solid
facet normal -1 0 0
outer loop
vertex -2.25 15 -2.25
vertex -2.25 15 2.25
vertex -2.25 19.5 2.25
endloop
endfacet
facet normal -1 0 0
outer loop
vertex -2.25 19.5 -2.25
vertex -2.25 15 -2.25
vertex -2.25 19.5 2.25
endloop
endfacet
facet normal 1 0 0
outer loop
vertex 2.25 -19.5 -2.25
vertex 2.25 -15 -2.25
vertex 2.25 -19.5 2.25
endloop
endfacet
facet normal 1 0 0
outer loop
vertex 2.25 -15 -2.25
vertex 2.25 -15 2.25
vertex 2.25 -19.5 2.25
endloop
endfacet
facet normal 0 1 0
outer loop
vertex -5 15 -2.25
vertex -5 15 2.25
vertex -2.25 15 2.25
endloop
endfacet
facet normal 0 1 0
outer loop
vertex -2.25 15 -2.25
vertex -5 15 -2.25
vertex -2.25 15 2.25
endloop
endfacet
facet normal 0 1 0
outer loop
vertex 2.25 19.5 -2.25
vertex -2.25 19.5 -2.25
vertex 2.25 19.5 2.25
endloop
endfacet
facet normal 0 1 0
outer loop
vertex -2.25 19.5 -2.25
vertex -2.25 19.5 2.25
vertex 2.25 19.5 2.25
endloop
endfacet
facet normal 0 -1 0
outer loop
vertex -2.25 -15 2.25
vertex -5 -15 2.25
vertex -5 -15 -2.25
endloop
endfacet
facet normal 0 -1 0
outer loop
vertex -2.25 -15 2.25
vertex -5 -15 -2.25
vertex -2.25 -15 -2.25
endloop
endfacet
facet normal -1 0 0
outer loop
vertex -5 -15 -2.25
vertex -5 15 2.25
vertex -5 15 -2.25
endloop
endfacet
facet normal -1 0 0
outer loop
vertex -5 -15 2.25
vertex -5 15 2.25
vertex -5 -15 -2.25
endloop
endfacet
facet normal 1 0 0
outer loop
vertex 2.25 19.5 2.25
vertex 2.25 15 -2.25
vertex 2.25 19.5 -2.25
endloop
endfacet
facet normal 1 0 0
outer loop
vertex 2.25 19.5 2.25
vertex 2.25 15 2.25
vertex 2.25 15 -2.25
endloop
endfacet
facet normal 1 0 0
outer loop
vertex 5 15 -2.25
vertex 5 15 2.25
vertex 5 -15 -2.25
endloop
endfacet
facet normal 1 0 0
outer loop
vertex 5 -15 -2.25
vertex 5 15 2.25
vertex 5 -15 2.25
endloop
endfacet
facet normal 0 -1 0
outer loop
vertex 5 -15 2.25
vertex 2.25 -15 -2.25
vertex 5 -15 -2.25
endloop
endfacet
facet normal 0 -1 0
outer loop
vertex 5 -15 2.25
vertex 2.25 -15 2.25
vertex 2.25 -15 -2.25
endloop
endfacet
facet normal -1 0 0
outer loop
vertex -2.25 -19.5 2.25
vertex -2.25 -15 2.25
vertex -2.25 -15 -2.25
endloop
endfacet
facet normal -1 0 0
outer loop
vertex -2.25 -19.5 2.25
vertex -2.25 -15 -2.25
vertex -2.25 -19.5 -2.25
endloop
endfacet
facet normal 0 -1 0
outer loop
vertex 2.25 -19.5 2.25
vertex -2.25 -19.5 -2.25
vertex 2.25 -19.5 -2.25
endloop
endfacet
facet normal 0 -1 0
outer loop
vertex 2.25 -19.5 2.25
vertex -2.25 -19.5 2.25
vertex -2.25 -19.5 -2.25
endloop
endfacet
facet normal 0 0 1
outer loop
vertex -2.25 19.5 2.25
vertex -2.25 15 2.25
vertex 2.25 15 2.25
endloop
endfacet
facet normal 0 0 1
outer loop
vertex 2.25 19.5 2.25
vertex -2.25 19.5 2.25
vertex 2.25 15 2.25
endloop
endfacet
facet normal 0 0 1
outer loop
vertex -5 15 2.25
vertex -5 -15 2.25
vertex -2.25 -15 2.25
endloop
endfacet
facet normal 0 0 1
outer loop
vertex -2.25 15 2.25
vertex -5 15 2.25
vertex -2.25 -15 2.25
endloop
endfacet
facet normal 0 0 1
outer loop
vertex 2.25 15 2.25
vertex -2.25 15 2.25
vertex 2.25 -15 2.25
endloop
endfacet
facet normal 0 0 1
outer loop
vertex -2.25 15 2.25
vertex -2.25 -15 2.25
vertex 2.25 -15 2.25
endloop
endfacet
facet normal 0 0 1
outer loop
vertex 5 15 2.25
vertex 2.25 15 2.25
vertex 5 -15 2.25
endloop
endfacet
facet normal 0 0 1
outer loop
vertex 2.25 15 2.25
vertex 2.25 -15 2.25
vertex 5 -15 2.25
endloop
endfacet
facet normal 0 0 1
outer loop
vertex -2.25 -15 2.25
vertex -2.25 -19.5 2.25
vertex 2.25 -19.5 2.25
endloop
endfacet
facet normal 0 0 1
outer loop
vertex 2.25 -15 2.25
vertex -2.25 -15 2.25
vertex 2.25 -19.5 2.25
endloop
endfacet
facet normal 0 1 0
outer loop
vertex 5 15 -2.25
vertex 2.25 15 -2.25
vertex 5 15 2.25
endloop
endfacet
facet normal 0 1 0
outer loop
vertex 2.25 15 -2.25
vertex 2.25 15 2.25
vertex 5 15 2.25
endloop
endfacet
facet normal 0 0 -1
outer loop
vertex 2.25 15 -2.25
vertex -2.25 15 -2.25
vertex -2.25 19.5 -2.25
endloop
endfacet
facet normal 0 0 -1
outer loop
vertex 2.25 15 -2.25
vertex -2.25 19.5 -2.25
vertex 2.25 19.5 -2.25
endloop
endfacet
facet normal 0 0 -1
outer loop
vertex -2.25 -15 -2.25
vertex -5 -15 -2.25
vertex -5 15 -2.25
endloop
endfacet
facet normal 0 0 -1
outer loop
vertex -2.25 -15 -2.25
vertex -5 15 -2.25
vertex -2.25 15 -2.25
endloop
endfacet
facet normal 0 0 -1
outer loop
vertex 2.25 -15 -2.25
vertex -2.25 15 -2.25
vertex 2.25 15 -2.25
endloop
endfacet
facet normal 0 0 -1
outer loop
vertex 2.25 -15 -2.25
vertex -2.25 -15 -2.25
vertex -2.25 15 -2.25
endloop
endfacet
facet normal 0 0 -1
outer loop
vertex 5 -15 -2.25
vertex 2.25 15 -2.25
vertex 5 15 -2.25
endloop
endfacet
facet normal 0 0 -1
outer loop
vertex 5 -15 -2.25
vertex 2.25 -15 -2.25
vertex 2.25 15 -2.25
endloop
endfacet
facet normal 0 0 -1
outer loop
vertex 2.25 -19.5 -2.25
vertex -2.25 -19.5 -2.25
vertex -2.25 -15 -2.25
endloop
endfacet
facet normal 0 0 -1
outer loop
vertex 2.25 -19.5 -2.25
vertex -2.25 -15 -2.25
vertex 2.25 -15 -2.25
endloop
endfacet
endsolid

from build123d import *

# Parameters (mm, degrees)
SKETCH2_W           = 4.5
SKETCH2_H           = 4.5
SKETCH2_W_2         = 10
SKETCH2_H_2         = 15
BOSS_EXTRUDE1_DEPTH = 2.25


with BuildPart() as part:
    # Sketch2 → Boss-Extrude1 (new body, symmetric)
    with BuildSketch(Plane.XY):
        with Locations((0, 17.25)):
            Rectangle(SKETCH2_W, SKETCH2_H)
        with Locations((0, 7.5)):
            Rectangle(SKETCH2_W_2, SKETCH2_H_2)
    extrude(amount=BOSS_EXTRUDE1_DEPTH, both=True)

    # Mirror1: part across plane


with BuildPart() as part_1:
    add(part.part)
    add(part.part.mirror(Plane.ZX))


solid = part_1.part
